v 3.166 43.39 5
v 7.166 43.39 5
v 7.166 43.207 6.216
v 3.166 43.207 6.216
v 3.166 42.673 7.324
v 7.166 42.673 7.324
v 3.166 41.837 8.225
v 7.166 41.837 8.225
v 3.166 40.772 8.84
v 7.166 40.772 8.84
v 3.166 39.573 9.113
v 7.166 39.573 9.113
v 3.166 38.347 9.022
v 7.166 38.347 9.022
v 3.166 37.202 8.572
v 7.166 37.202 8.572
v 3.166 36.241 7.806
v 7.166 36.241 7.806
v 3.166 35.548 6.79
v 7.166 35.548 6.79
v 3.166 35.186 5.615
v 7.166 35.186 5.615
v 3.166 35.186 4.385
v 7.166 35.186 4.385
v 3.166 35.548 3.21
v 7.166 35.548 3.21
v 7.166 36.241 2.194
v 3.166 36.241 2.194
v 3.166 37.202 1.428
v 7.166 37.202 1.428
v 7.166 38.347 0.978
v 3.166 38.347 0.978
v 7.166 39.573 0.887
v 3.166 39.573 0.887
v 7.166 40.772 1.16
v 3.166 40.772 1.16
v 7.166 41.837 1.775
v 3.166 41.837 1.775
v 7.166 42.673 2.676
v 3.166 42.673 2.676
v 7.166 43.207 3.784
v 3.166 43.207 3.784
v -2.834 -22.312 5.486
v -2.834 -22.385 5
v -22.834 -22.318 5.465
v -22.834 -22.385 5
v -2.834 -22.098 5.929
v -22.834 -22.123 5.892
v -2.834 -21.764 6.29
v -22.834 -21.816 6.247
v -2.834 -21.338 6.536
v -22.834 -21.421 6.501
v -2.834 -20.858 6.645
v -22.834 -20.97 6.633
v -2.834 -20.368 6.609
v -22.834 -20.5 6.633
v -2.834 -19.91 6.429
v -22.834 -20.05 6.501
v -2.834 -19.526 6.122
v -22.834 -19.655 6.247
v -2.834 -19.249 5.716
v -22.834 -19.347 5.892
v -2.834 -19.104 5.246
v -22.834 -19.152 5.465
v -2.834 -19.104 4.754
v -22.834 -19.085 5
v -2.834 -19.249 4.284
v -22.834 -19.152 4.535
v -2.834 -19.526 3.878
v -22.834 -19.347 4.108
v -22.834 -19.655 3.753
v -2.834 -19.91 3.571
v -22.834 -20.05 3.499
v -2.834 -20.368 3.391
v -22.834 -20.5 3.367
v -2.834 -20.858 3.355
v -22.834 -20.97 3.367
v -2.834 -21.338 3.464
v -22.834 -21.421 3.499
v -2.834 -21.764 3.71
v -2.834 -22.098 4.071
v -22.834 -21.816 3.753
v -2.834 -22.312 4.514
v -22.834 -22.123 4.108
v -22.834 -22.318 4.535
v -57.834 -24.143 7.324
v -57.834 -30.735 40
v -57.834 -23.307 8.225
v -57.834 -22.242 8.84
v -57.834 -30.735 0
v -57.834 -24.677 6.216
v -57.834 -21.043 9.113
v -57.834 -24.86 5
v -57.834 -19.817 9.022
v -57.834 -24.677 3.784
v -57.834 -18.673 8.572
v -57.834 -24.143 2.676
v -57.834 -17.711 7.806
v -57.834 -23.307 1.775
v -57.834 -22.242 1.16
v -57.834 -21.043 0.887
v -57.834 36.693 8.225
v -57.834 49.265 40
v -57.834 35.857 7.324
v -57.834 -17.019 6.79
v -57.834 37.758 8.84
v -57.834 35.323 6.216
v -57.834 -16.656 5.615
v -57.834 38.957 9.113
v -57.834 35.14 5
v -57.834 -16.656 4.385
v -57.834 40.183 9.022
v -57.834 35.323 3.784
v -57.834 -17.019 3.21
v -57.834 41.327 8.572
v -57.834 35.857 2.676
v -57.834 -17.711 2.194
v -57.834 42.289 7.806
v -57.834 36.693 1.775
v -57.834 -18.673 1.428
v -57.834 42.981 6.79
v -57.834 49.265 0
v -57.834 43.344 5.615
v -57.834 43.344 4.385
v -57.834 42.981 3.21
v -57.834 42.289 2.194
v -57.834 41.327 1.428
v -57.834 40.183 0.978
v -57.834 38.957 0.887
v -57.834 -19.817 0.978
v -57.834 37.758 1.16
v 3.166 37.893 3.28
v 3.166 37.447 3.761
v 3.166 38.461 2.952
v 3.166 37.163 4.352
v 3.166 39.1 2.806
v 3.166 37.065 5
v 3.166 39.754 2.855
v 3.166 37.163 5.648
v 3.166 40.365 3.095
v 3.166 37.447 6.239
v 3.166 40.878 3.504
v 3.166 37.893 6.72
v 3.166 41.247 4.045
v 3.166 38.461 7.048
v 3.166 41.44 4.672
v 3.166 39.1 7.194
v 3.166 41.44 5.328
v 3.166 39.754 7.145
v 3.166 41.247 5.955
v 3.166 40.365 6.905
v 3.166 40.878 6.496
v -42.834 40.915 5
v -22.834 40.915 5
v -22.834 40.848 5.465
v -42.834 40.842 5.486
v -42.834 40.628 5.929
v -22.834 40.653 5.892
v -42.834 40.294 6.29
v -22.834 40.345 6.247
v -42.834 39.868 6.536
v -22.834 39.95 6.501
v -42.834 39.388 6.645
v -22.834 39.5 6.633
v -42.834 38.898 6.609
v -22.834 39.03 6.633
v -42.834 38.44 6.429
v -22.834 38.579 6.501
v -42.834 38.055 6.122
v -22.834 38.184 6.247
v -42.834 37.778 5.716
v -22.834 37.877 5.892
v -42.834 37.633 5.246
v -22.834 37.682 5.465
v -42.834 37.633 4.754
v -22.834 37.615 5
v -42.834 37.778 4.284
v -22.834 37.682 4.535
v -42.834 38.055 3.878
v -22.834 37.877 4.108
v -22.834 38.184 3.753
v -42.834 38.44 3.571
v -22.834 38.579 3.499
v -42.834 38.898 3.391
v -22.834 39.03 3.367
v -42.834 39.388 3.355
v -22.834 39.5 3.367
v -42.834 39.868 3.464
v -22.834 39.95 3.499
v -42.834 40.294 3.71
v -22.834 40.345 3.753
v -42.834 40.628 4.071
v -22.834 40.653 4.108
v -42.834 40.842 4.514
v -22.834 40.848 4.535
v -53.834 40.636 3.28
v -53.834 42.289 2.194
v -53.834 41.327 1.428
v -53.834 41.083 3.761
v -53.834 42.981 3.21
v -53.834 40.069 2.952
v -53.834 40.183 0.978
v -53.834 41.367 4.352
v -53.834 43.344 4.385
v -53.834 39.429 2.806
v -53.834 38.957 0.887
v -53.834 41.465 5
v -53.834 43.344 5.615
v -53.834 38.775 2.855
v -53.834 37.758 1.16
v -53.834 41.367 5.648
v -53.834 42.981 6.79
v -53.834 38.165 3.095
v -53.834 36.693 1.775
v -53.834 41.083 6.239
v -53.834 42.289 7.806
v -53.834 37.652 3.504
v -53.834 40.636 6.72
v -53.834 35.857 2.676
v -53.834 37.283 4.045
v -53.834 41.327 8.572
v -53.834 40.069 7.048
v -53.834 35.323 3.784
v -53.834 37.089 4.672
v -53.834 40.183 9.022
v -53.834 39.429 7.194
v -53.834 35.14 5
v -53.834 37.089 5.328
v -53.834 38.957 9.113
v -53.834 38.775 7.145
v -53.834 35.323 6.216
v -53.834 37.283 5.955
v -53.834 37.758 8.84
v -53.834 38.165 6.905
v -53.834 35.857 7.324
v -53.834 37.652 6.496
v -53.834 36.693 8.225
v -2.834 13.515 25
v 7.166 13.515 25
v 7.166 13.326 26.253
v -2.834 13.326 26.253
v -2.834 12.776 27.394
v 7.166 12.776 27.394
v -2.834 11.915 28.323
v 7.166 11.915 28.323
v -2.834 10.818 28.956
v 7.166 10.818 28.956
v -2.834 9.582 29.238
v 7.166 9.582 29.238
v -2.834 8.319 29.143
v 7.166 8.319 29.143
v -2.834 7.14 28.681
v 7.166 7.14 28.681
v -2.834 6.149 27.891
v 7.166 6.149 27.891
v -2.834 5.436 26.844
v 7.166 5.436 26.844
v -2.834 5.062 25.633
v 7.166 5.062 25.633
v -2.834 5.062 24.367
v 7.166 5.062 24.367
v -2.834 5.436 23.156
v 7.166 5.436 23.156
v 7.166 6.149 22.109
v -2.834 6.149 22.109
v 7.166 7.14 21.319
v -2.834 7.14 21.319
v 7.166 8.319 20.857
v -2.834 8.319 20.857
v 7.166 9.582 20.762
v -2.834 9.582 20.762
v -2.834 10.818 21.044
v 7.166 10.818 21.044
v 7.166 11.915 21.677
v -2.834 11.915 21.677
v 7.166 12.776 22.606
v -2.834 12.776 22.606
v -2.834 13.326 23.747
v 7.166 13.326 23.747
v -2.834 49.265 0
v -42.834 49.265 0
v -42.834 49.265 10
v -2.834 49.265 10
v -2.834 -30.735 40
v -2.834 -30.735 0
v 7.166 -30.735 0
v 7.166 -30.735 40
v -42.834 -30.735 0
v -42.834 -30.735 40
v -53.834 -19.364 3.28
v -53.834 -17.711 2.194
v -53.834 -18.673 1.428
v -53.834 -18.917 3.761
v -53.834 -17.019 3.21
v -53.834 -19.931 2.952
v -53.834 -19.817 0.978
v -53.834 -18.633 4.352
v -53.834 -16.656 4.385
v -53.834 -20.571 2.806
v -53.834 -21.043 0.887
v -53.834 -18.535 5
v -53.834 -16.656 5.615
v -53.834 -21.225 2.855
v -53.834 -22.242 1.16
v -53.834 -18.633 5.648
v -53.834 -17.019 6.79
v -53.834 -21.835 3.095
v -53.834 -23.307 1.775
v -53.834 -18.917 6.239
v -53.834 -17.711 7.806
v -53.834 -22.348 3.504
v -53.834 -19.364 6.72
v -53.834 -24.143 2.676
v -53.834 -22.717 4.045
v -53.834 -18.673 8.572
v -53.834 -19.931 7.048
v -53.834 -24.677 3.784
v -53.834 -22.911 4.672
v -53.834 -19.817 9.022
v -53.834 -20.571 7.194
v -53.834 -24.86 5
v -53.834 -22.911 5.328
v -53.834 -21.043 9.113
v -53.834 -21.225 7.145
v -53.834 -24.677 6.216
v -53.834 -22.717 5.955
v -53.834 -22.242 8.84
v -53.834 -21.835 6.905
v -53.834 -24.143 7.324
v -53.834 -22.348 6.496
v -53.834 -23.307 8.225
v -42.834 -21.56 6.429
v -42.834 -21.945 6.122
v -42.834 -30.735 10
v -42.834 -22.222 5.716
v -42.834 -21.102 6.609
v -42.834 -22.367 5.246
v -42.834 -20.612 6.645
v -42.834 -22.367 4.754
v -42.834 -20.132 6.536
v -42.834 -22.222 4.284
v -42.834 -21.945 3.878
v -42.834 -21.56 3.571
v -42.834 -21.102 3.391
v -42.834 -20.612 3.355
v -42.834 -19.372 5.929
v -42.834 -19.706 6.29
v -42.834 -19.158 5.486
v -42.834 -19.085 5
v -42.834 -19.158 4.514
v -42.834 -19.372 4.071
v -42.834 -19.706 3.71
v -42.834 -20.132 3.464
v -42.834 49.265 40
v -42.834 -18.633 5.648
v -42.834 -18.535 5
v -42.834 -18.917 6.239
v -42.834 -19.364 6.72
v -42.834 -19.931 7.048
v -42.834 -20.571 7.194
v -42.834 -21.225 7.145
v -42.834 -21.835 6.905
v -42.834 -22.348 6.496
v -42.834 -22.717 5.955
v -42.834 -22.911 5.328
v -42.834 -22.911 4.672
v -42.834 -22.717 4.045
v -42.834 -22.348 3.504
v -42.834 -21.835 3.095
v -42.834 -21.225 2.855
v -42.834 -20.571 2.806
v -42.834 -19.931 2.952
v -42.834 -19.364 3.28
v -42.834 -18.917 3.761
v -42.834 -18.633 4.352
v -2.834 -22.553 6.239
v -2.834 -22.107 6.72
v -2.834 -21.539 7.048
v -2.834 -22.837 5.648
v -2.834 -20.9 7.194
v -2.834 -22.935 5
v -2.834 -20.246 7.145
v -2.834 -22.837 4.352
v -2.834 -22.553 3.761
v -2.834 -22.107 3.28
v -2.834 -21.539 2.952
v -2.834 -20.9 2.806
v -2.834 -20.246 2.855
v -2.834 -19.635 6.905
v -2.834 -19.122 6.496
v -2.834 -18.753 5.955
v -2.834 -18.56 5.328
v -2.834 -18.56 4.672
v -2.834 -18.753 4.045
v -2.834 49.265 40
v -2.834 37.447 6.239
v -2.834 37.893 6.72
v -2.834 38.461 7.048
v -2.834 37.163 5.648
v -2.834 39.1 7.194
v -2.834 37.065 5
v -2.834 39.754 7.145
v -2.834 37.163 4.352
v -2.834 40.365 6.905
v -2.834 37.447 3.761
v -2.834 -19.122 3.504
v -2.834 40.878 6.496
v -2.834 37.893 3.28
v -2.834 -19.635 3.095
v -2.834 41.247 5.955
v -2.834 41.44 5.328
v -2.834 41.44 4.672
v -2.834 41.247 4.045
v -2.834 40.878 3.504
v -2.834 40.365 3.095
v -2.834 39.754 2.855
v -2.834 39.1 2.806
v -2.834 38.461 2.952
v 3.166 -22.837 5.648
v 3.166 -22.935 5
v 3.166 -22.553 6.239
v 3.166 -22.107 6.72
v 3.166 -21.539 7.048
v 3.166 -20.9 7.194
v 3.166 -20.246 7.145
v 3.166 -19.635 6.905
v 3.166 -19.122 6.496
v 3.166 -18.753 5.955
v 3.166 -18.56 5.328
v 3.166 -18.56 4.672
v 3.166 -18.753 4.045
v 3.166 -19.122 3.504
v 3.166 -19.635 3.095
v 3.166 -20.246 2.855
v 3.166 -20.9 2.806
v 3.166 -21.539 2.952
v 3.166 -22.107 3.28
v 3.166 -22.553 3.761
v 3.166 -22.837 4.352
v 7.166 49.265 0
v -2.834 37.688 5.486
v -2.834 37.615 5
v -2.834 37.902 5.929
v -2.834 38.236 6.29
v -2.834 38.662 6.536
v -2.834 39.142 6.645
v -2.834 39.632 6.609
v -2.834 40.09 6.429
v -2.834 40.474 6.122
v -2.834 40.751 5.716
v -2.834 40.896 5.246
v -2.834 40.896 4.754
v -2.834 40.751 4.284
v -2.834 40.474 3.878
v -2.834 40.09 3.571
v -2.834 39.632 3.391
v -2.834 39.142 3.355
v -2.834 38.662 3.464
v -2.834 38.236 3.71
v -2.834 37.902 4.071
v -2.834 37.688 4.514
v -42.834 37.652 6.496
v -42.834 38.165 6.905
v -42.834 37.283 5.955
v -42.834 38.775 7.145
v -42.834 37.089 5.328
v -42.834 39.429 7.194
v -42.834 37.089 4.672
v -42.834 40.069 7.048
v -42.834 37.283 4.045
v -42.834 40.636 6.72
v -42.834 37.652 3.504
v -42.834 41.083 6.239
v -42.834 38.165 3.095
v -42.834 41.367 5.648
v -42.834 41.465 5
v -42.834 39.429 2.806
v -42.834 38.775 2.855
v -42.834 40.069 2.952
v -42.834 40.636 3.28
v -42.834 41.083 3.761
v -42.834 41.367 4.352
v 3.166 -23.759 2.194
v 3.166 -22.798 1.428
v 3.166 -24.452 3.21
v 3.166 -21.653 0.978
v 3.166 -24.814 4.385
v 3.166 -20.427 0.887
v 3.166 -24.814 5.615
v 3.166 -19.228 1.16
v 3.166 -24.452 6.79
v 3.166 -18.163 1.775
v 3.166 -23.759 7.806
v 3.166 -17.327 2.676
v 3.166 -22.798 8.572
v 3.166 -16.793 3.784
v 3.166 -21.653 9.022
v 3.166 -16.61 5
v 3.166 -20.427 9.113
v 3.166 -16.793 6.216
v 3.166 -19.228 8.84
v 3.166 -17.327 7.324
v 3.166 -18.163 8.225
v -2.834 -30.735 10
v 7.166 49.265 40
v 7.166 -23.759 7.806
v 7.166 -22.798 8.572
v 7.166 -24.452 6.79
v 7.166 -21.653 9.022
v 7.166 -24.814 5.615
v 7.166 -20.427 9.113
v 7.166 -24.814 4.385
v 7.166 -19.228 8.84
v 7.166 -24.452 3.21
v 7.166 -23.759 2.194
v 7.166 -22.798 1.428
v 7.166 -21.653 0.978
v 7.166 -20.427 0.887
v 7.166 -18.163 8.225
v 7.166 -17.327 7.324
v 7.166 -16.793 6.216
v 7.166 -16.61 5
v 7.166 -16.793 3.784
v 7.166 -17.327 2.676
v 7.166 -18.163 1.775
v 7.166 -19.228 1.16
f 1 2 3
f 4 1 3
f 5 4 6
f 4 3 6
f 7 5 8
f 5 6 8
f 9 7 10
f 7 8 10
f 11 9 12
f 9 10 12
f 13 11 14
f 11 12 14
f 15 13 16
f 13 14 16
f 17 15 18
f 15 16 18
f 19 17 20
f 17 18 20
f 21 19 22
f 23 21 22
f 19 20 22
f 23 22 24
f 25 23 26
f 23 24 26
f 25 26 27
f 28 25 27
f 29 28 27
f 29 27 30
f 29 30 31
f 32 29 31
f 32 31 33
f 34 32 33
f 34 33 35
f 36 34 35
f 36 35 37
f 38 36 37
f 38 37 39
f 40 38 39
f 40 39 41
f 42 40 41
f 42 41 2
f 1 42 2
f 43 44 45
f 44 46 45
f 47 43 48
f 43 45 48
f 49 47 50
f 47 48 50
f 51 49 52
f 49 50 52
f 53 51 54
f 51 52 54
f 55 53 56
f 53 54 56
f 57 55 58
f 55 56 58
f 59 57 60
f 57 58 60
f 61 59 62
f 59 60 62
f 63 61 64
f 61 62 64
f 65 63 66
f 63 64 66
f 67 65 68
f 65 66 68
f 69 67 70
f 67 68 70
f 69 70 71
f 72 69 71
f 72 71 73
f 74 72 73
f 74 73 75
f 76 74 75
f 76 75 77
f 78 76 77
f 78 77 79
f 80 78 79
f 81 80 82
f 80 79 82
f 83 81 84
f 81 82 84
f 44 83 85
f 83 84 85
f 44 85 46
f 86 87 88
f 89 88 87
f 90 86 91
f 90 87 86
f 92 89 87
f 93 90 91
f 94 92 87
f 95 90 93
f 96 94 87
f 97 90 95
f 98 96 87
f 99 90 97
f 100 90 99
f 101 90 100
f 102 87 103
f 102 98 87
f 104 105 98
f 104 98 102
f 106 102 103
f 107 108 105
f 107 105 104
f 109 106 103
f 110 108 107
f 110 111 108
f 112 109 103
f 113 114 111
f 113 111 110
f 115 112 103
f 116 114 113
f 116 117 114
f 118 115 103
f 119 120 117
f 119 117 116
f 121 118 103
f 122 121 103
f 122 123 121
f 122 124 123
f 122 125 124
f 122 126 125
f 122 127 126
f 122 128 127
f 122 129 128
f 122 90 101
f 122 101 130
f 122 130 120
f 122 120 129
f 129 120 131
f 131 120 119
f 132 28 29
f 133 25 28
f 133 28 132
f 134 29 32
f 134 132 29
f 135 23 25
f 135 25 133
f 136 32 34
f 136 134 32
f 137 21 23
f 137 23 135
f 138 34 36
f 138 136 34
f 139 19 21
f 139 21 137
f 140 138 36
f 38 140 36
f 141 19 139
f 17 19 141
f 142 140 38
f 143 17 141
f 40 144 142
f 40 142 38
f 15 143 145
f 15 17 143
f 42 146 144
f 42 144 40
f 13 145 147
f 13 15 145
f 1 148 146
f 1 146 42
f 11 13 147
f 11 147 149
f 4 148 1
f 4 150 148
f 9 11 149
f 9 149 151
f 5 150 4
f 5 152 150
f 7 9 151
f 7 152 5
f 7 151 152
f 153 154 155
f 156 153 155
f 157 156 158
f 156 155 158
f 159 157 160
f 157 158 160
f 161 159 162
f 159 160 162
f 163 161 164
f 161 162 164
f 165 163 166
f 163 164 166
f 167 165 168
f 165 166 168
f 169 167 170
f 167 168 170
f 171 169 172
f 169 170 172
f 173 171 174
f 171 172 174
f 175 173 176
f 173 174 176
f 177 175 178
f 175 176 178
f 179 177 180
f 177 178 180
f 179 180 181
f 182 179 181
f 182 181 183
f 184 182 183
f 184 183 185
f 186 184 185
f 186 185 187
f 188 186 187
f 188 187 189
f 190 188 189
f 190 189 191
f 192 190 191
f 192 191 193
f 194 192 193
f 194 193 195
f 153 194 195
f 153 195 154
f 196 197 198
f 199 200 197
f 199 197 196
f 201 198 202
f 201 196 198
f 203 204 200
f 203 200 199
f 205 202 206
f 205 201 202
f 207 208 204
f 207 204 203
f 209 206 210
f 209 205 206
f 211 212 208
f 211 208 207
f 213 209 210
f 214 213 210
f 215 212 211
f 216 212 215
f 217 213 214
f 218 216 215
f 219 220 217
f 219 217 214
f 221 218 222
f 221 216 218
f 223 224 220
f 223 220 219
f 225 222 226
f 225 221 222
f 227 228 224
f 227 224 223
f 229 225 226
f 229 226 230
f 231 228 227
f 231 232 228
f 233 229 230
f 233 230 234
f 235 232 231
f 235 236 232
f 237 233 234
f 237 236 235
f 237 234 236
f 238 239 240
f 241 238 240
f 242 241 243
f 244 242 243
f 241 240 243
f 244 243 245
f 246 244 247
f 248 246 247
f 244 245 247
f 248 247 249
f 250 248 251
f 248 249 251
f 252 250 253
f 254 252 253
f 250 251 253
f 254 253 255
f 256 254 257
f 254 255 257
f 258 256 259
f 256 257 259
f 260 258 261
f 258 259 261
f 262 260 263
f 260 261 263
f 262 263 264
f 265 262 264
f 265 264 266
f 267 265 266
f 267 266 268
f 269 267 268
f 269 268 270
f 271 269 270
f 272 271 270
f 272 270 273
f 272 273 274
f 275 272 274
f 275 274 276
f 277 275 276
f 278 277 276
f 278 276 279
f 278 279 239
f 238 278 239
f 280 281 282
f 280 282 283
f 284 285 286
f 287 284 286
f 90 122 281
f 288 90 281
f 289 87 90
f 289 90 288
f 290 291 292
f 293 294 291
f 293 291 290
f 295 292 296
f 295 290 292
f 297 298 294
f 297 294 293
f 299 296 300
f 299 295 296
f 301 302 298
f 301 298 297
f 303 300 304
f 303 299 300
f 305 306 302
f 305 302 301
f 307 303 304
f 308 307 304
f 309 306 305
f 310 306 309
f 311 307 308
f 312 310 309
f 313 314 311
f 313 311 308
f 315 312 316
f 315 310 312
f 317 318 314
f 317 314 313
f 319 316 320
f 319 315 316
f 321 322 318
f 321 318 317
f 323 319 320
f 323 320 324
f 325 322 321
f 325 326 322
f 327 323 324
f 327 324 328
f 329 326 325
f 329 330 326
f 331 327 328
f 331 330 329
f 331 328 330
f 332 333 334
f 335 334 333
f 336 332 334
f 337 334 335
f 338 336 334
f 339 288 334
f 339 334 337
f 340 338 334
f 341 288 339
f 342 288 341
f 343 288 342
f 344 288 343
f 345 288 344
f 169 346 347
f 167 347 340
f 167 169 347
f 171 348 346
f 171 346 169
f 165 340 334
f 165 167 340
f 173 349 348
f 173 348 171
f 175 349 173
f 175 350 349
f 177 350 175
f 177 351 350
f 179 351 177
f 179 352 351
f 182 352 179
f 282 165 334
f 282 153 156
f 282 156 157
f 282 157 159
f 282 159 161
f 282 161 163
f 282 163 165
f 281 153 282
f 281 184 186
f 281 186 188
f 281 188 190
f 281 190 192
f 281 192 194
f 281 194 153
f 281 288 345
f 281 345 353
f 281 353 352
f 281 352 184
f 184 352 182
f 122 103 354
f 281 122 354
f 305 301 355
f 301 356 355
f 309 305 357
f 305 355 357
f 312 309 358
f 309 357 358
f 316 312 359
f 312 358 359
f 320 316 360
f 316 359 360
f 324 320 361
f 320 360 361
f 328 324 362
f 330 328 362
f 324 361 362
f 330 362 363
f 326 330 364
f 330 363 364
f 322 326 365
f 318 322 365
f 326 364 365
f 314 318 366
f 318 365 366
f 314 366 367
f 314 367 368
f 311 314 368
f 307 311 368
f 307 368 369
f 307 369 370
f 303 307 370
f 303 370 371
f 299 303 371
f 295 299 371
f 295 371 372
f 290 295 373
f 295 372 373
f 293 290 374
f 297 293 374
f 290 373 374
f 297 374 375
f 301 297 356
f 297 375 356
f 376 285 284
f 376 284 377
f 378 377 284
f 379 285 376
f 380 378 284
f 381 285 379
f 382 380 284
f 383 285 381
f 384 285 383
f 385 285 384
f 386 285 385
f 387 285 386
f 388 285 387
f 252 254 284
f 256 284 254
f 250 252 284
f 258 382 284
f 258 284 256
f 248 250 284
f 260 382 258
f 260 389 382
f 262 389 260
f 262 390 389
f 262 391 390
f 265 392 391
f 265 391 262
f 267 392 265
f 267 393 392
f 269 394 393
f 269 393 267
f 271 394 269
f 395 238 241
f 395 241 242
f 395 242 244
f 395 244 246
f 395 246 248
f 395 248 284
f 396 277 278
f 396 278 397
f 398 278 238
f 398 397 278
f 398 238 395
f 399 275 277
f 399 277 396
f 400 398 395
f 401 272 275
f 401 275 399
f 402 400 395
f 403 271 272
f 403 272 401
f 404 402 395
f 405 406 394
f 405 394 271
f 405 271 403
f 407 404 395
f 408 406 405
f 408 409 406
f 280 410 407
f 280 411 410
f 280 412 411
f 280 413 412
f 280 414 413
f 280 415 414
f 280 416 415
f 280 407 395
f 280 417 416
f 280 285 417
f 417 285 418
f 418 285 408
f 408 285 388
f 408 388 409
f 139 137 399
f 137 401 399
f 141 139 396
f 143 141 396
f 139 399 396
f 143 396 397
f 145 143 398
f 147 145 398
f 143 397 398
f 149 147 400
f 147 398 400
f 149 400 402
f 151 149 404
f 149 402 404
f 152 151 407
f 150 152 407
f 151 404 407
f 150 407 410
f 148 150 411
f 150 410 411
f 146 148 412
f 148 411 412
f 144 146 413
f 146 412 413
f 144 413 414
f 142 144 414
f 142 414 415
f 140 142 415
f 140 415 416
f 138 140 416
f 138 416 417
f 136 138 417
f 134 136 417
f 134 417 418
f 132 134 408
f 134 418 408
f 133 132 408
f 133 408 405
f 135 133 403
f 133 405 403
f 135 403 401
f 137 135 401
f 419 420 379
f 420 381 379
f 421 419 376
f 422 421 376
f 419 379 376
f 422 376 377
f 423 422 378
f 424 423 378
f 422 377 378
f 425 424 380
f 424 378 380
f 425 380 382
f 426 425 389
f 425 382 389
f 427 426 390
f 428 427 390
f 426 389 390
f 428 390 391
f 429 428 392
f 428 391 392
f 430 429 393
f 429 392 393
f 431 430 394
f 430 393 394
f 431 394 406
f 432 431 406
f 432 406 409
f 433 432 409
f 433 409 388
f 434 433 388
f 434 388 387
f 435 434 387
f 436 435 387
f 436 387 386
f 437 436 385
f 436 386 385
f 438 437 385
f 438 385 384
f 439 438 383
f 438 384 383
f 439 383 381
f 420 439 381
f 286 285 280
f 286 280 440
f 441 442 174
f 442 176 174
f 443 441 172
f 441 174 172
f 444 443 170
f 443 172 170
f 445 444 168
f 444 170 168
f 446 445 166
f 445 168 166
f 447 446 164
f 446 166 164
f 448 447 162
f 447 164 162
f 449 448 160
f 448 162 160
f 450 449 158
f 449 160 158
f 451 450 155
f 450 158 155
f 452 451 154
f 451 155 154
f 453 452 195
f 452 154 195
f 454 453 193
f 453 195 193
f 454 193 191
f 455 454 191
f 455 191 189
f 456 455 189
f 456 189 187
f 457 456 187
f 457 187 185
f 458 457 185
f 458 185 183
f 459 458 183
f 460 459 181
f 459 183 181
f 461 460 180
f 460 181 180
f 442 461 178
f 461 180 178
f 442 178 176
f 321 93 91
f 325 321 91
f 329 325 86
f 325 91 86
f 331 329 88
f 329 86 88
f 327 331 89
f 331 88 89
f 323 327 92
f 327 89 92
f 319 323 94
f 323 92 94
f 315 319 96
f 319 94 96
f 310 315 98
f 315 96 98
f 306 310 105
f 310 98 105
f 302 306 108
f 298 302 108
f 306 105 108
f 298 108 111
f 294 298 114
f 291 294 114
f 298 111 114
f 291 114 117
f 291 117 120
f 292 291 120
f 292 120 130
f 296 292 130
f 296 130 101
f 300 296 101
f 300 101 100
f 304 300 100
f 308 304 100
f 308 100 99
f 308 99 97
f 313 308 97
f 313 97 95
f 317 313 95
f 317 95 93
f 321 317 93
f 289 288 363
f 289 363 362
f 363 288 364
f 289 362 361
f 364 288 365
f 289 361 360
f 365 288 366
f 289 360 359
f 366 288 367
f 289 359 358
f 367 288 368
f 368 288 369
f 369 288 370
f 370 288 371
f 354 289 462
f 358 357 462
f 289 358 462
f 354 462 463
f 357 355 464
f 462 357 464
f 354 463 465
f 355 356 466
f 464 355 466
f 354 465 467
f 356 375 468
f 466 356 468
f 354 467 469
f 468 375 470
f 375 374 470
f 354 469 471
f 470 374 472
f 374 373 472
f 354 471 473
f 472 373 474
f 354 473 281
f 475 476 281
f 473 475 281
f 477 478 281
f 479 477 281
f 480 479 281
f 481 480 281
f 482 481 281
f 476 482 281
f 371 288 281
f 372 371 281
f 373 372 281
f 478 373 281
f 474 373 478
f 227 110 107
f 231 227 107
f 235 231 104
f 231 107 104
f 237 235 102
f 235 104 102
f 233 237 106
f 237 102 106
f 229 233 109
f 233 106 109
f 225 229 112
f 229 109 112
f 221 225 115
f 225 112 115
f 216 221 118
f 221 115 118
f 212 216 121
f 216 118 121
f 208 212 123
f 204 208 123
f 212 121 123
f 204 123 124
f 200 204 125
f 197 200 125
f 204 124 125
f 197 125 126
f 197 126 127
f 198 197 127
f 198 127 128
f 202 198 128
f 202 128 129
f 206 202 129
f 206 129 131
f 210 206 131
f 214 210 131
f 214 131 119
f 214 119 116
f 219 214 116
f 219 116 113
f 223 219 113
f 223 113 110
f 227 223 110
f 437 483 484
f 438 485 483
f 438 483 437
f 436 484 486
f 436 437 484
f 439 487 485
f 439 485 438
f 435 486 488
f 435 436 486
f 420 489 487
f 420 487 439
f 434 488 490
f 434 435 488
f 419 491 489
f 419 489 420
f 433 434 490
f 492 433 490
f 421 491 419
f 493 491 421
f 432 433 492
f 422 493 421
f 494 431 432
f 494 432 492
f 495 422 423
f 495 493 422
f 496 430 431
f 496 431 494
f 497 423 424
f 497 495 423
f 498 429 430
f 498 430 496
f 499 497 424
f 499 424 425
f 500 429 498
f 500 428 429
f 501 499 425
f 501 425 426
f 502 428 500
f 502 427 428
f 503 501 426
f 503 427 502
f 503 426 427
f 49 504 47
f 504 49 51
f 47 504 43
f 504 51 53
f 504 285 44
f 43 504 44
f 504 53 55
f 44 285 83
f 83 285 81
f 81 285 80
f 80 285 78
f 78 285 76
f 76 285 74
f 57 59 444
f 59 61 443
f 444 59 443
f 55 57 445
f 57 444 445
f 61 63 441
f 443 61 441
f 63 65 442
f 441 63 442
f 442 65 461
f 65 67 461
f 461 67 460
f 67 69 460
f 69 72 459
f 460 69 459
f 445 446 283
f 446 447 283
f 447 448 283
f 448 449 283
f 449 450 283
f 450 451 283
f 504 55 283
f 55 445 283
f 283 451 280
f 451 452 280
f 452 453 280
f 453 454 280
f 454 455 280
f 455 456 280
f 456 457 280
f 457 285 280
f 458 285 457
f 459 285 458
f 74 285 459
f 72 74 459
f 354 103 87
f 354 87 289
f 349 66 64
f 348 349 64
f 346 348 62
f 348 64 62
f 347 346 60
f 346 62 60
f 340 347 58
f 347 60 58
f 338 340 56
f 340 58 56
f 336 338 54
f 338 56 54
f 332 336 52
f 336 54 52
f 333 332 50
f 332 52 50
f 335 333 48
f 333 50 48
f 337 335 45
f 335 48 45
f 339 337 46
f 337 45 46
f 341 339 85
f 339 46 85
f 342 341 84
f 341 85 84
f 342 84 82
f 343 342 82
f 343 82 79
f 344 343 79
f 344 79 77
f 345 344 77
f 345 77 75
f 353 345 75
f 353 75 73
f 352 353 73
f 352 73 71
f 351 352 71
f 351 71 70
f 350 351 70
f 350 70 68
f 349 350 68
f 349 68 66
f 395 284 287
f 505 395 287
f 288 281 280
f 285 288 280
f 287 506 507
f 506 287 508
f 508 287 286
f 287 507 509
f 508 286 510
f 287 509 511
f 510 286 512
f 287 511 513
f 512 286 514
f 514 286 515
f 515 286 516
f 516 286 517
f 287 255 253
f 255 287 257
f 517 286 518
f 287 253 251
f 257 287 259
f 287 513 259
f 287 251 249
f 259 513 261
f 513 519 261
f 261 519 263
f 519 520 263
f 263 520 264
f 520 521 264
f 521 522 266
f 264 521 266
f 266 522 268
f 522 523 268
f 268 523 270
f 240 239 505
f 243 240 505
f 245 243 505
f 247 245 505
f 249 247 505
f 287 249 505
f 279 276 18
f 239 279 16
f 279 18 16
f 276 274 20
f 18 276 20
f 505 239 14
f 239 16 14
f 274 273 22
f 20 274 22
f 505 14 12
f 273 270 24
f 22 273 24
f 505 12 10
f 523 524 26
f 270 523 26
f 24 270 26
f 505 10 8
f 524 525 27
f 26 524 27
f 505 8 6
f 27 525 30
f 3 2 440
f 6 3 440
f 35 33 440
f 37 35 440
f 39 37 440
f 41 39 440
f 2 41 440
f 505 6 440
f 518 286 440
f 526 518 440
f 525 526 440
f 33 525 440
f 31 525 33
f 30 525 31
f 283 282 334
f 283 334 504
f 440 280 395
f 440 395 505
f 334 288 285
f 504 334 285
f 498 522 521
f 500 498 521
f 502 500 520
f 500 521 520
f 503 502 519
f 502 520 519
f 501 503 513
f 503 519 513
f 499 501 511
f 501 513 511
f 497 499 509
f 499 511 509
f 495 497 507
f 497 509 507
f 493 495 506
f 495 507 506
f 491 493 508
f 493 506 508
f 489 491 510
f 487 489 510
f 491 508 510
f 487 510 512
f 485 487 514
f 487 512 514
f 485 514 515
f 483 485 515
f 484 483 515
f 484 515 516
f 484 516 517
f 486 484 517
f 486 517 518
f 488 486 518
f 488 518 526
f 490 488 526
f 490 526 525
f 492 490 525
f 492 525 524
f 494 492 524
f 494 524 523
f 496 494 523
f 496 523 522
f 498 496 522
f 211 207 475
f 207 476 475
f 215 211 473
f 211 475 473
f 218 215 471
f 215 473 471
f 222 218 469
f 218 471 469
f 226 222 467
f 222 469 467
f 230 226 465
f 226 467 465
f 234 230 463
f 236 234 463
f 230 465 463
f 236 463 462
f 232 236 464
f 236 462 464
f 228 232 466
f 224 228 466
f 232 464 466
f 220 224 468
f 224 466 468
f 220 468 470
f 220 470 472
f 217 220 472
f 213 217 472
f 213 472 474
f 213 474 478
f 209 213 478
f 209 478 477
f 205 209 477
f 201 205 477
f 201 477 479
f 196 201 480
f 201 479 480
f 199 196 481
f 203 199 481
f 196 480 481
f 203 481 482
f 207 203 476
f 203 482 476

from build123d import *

# Parameters (mm, degrees)
F0_W           = 40
F0_H           = 80
F1_DEPTH       = 10
F0_W_2         = 15
F2_DEPTH       = 40
F0_W_3         = 10
F4_D           = 4.4
F4_CBORE_D     = 8.25
F4_CBORE_DEPTH = 4
F5_D           = 3.3
F5_DEPTH       = 20
F5_START       = 10
F5_TIP         = 0.9914200214
F7_D           = 4.4
F7_CBORE_D     = 8.25
F7_CBORE_DEPTH = 4
F8_D           = 3.3
F8_DEPTH       = 20
F8_START       = 15
F8_TIP         = 0.9914200214
F9_D           = 8.5


with BuildPart() as f1:
    # F0 (on Top) → F1 (new body)
    with BuildSketch(Plane.XY):
        with Locations((-22.8335411847, 9.2648183657)):
            Rectangle(F0_W, F0_H)
    extrude(amount=F1_DEPTH)

    # F5
    # its depths count from where the whole tool has entered the part; down to there all is cleared
    with Locations(Plane.YZ.offset(7.1664588153).offset(-F5_START)):
        with Locations((-20.7351816343, 5), (39.2648183657, 5)):
            Hole(F5_D / 2, depth=F5_DEPTH)
            with Locations((0, 0, -(F5_DEPTH + F5_TIP / 2))):  # 118° drill point
                Cone(0, F5_D / 2, F5_TIP, mode=Mode.SUBTRACT)

    # F8
    # its depths count from where the whole tool has entered the part; down to there all is cleared
    with Locations(Plane(origin=(-57.8335411847, 0, 0), x_dir=(0, -1, 0), z_dir=(-1, 0, 0)).offset(-F8_START)):
        with Locations((-39.2648183657, 5), (20.7351816343, 5)):
            Hole(F8_D / 2, depth=F8_DEPTH)
            with Locations((0, 0, -(F8_DEPTH + F8_TIP / 2))):  # 118° drill point
                Cone(0, F8_D / 2, F8_TIP, mode=Mode.SUBTRACT)


with BuildPart() as f2:
    # F0 (on Top) → F2 (new body)
    with BuildSketch(Plane.XY):
        with Locations((-50.3335411847, 9.2648183657)):
            Rectangle(F0_W_2, F0_H)
    extrude(amount=F2_DEPTH)

    # F7 (through all)
    with Locations(Plane(origin=(-57.8335411847, 0, 0), x_dir=(0, -1, 0), z_dir=(-1, 0, 0))):
        with Locations((-39.2648183657, 5), (20.7351816343, 5)):
            CounterBoreHole(F7_D / 2, F7_CBORE_D / 2, F7_CBORE_DEPTH)


with BuildPart() as f2b:
    # F0 (on Top) → F2, piece 2 (new body)
    with BuildSketch(Plane.XY):
        with Locations((2.1664588153, 9.2648183657)):
            Rectangle(F0_W_3, F0_H)
    extrude(amount=F2_DEPTH)

    # F4 (through all)
    with Locations(Plane.YZ.offset(7.1664588153)):
        with Locations((-20.7351816343, 5), (39.2648183657, 5)):
            CounterBoreHole(F4_D / 2, F4_CBORE_D / 2, F4_CBORE_DEPTH)

    # F9 (through all)
    with Locations(Plane(origin=(-57.8335411847, 0, 0), x_dir=(0, -1, 0), z_dir=(-1, 0, 0))):
        with Locations((-9.2648183657, 25)):
            Hole(F9_D / 2)


solid = Compound([f1.part, f2.part, f2b.part])
